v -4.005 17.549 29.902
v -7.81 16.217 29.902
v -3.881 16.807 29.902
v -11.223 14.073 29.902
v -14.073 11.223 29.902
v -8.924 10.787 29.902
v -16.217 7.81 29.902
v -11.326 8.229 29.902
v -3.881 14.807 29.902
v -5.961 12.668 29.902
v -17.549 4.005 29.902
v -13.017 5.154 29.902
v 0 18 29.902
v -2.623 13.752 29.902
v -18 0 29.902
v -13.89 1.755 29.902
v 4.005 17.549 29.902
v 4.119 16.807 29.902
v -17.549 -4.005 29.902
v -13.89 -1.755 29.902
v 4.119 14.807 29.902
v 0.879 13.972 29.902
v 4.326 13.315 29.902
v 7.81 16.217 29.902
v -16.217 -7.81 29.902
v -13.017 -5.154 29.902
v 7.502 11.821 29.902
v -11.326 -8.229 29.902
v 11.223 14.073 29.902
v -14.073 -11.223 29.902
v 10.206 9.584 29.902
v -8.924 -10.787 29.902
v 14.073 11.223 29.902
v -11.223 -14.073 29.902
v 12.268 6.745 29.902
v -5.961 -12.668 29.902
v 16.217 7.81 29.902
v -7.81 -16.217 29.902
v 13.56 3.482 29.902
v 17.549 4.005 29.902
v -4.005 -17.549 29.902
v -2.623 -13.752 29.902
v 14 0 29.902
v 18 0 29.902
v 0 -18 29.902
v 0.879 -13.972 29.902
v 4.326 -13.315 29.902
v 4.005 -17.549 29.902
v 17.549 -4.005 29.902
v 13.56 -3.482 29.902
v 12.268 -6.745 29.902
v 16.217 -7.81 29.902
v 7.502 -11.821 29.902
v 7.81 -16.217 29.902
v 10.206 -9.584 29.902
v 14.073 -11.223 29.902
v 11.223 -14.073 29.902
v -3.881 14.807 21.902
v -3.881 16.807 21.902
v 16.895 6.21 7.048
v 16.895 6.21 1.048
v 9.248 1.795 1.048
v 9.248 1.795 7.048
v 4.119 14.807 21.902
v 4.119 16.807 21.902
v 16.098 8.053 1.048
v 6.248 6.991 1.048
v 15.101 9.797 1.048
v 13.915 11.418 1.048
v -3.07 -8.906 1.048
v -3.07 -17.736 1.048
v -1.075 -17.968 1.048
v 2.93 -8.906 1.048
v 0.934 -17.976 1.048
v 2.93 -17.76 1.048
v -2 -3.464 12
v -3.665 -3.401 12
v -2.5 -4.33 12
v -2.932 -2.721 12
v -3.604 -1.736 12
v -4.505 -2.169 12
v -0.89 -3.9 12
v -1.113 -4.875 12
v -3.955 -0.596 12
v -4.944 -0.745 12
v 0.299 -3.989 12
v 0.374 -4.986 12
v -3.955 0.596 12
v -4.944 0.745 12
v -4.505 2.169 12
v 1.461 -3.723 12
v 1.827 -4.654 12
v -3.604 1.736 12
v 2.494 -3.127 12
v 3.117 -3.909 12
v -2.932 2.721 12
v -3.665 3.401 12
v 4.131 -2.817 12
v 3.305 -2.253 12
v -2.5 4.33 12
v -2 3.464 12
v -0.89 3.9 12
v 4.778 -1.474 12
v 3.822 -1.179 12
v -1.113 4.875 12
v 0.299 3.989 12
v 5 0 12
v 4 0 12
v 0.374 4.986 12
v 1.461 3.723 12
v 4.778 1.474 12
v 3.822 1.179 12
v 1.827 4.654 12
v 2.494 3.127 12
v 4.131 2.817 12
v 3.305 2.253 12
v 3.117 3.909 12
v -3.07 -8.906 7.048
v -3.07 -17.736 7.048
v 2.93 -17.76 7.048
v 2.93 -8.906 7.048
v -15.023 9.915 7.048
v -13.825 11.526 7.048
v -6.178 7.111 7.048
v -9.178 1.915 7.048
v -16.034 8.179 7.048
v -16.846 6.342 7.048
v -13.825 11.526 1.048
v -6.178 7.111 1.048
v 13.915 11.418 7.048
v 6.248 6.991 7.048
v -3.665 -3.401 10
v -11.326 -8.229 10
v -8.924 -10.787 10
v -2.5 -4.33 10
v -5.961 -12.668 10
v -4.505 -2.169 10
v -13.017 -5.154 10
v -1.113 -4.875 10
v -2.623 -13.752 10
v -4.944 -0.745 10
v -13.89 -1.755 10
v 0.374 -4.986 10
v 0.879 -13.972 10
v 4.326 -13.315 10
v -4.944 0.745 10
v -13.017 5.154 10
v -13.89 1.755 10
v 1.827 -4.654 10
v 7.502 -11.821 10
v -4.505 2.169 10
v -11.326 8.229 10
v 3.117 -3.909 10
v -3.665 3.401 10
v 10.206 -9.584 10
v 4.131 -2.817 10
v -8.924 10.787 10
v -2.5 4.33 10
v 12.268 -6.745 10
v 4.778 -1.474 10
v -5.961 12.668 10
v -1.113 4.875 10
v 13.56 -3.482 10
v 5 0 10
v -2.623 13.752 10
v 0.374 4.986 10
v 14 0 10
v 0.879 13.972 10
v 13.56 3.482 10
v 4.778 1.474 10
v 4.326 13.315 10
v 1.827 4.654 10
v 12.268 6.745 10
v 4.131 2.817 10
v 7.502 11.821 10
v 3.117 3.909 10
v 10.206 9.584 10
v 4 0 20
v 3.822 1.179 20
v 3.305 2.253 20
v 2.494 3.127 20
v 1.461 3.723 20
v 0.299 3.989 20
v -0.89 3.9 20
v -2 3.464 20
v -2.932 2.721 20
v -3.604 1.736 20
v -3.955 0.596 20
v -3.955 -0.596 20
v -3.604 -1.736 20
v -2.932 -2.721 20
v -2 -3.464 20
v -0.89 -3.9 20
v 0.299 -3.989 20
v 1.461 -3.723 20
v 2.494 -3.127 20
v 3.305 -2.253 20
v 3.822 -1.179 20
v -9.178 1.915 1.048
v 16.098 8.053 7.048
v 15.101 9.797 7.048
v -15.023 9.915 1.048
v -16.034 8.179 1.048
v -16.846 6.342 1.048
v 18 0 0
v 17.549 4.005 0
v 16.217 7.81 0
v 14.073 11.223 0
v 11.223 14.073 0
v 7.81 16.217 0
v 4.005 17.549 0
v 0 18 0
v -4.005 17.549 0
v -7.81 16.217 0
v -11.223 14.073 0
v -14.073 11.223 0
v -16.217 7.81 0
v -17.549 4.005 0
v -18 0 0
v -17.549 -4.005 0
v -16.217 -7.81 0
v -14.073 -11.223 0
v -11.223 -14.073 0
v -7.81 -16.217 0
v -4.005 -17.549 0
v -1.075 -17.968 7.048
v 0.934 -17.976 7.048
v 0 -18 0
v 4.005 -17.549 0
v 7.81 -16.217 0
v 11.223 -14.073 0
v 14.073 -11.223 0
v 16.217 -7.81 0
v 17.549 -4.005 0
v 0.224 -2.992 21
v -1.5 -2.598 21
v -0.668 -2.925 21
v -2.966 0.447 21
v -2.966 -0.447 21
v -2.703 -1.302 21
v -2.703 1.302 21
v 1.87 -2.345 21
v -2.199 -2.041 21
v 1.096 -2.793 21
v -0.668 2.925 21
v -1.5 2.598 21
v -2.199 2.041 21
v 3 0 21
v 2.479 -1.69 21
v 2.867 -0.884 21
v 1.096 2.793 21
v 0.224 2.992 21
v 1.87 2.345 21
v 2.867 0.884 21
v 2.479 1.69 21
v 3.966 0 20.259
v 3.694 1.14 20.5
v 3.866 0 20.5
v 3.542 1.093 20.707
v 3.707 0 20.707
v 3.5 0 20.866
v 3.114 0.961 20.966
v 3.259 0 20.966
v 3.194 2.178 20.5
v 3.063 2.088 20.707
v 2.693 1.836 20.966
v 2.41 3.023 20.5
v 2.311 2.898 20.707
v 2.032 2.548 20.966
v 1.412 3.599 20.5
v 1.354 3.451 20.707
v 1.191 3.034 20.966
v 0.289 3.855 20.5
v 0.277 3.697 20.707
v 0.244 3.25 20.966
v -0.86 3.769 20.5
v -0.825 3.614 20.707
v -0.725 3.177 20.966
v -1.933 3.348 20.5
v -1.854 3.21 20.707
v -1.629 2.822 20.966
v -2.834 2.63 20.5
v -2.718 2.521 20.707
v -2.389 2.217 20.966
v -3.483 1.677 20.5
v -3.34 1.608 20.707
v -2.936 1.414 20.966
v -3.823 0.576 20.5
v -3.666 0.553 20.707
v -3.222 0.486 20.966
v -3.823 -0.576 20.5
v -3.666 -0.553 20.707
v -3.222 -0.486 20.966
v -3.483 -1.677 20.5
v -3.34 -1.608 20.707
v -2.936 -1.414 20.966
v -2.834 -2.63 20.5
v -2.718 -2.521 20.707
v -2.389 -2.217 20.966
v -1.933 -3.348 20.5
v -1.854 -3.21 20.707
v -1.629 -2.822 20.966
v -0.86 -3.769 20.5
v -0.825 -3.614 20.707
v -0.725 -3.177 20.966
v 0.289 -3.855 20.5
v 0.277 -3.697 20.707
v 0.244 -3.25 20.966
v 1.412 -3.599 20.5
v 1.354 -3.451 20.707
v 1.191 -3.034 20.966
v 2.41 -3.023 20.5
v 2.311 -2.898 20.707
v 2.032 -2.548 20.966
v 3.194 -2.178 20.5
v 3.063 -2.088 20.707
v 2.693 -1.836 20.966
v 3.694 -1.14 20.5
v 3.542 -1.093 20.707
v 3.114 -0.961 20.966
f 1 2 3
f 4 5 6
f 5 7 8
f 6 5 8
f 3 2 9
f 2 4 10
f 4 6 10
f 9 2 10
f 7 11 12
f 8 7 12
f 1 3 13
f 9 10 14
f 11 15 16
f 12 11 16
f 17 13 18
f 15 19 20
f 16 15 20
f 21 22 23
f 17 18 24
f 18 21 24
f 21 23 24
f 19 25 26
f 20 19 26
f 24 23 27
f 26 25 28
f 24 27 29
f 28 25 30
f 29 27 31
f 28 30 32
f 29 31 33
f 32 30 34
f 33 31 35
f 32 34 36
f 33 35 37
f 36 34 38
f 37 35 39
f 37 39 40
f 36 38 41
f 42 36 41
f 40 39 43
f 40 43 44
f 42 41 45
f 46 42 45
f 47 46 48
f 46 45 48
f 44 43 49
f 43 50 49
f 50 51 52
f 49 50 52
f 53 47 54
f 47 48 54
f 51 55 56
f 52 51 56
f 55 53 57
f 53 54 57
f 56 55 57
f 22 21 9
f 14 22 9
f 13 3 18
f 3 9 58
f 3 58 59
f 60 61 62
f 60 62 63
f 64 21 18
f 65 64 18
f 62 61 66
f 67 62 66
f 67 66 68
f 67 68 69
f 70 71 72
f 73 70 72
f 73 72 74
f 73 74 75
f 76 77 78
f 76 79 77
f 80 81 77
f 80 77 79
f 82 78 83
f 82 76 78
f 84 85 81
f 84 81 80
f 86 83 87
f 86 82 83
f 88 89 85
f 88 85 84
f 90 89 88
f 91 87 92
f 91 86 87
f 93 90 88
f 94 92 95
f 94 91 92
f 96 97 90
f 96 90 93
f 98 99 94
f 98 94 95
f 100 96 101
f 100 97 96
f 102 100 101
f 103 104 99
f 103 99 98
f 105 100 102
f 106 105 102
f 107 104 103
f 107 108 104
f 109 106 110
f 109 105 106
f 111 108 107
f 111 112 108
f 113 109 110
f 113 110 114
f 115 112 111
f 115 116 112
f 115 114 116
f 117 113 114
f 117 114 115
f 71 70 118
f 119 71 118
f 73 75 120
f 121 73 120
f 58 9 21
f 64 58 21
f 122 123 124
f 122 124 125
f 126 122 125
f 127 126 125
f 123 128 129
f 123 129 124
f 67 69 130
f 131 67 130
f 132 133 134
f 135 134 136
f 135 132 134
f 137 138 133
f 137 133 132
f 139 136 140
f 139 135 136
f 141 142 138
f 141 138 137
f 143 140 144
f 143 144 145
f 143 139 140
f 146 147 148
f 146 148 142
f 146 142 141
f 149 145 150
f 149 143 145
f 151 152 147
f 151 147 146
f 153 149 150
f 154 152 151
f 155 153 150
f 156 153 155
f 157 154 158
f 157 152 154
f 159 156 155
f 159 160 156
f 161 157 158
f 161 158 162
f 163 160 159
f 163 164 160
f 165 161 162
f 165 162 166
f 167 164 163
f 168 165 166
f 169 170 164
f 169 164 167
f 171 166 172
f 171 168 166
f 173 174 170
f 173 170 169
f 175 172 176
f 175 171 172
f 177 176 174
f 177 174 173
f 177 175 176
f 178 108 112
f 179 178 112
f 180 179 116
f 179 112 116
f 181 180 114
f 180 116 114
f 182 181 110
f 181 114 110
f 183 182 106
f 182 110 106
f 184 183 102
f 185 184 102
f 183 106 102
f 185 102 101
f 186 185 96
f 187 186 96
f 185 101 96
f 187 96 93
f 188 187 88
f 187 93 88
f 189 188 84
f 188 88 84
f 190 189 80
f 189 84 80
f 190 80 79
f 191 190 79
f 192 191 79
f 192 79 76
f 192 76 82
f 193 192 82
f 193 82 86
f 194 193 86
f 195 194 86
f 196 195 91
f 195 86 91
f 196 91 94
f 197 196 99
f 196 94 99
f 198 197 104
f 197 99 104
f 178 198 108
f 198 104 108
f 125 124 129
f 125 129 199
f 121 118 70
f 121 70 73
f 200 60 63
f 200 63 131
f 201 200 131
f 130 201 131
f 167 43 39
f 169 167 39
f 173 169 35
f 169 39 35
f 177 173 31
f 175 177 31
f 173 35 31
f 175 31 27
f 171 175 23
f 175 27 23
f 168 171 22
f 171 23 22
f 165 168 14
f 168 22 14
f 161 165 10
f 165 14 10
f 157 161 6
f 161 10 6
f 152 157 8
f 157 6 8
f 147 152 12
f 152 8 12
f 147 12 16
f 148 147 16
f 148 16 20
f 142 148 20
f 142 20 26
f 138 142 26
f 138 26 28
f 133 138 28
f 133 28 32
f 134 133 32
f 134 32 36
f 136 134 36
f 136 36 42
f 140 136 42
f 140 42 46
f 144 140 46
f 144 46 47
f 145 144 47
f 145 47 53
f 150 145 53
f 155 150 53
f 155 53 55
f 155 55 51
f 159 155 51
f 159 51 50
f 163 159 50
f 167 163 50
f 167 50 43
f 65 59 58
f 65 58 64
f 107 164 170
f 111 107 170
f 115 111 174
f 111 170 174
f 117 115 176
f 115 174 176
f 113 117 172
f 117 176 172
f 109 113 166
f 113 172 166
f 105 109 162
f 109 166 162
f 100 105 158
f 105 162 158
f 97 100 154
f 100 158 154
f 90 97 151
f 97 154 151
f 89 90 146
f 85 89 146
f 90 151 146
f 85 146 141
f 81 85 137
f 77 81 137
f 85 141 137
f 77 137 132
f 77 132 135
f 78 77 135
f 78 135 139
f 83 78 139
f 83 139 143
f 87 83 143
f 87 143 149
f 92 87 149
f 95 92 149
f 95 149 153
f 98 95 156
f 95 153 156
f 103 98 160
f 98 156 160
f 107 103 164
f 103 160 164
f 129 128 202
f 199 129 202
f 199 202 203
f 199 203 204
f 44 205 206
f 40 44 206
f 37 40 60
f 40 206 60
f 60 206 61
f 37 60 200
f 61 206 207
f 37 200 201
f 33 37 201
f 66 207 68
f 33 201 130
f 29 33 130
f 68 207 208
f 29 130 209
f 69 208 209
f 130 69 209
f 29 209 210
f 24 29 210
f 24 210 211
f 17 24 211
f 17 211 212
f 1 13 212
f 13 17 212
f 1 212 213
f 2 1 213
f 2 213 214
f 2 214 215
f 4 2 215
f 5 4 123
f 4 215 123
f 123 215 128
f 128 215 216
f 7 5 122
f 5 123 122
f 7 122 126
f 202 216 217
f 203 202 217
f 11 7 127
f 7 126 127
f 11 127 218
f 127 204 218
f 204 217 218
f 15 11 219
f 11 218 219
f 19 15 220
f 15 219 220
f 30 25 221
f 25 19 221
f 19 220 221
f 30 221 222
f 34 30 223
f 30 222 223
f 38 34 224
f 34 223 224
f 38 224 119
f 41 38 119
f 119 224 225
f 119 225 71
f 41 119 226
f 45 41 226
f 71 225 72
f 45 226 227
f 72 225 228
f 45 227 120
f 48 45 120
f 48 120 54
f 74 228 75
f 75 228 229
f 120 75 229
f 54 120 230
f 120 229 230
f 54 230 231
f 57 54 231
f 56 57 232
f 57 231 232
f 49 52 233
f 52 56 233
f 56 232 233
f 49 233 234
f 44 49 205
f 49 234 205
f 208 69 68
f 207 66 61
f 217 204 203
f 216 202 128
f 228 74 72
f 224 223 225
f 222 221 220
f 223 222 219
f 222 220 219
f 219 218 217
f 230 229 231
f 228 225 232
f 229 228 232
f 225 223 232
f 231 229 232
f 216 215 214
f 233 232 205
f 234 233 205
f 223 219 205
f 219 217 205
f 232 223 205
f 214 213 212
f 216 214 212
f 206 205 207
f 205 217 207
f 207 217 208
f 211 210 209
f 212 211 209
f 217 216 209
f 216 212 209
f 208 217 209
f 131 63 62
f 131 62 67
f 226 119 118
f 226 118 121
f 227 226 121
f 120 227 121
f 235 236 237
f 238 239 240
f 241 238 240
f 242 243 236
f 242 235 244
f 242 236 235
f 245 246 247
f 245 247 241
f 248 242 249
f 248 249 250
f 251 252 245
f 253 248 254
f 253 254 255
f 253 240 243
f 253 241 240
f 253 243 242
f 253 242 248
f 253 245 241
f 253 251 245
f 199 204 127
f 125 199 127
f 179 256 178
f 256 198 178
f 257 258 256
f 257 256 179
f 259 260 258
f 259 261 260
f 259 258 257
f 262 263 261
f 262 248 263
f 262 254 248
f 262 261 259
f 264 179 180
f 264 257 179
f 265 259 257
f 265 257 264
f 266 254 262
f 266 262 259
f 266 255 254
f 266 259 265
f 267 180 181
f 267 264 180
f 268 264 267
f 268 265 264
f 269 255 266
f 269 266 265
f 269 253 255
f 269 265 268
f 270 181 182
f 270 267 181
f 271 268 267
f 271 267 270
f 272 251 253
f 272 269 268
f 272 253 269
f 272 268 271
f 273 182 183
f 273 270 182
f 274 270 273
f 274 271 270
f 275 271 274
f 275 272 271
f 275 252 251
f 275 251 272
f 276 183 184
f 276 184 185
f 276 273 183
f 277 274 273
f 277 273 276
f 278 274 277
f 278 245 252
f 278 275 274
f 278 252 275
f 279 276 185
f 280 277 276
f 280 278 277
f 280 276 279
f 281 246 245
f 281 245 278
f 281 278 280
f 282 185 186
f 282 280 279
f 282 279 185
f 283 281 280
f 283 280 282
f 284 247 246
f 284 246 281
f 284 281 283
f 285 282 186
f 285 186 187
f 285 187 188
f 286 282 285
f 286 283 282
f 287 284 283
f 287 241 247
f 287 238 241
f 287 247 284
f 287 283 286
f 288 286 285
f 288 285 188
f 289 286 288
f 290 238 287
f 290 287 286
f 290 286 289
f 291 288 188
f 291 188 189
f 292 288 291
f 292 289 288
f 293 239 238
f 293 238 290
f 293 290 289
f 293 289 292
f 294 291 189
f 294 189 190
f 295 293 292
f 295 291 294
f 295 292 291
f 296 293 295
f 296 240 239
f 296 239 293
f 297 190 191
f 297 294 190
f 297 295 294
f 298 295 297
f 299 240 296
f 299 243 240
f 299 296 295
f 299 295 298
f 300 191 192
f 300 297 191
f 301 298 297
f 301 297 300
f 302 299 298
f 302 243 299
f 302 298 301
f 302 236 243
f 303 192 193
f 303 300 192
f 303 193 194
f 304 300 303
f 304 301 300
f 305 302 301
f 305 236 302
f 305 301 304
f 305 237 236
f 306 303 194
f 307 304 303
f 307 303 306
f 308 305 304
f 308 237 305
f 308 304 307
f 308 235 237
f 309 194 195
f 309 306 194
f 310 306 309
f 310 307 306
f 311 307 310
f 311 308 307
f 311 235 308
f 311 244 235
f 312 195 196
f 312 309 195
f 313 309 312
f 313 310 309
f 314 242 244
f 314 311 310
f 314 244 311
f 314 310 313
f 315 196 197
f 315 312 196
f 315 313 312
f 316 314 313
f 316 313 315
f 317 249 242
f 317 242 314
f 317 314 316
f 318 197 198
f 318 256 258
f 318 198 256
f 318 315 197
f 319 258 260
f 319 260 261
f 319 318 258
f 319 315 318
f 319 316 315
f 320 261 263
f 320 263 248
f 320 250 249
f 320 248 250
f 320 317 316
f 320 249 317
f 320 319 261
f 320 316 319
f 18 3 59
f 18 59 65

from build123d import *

# Parameters (mm, degrees)
SKETCH_R           = 18
PAD_DEPTH          = 30
SKETCH001_R        = 14
POCKET_DEPTH       = 20
SKETCH002_R        = 5
PAD001_DEPTH       = 2
SKETCH003_R        = 4
PAD002_DEPTH       = 9
FILLET_R           = 1
SKETCH004_W        = 47.033489
SKETCH004_H        = 47.446069
PAD003_DEPTH       = 10
SKETCH005_W        = 6
SKETCH005_H        = 6
POCKET001_DEPTH    = 15
POLARPATTERN_COUNT = 3
SKETCH006_W        = 48.40057
SKETCH006_H        = 10.44081
POCKET002_DEPTH    = 47.447069
SKETCH007_W        = 8
SKETCH007_H        = 2
POCKET003_DEPTH    = 8


with BuildPart() as part:
    # Sketch → Pad (new body)
    with BuildSketch(Plane.XY):
        Circle(SKETCH_R)
    extrude(amount=PAD_DEPTH)

    # Sketch001 (on Face3 of Pad) → Pocket (cut)
    with BuildSketch(Plane.XY.offset(30)):
        Circle(SKETCH001_R)
    extrude(amount=-POCKET_DEPTH, mode=Mode.SUBTRACT)

    # Sketch002 (on Face5 of Pocket) → Pad001 (join)
    with BuildSketch(Plane.XY.offset(10)):
        Circle(SKETCH002_R)
    extrude(amount=PAD001_DEPTH)

    # Sketch003 (on Face7 of Pad001) → Pad002 (join)
    with BuildSketch(Plane.XY.offset(12)):
        Circle(SKETCH003_R)
    extrude(amount=PAD002_DEPTH)

    # Fillet
    fillet_edges = [part.edges().sort_by_distance(p)[0] for p in [
        (-4, 0, 21),
    ]]
    fillet(fillet_edges, radius=FILLET_R)

    # Sketch004 (on Face8 of Fillet) → Pad003 (join)
    with BuildSketch(Plane.XY.offset(30)):
        with Locations((0.145404, -0.183003)):
            Rectangle(SKETCH004_W, SKETCH004_H)
    extrude(amount=PAD003_DEPTH)

    # Sketch005 (on Face6 of Pad003) → Pocket001 (cut)
    with BuildSketch(Plane.XZ.offset(23.906038)):
        with Locations((-0.069517, 4.047801)):
            Rectangle(SKETCH005_W, SKETCH005_H)
    pocket001 = extrude(amount=-POCKET001_DEPTH, mode=Mode.SUBTRACT)

    # PolarPattern: Pocket001 ×3 about axis
    polarpattern_axis = Axis((0, 0, 0), (0, 0, 1))
    for i in range(1, POLARPATTERN_COUNT):
        add(pocket001.rotate(polarpattern_axis, i * 360 / POLARPATTERN_COUNT), mode=Mode.SUBTRACT)

    # Sketch006 (on Face6 of PolarPattern) → Pocket002 (cut, through all)
    with BuildSketch(Plane.XZ.offset(23.906038)):
        with Locations((0.264744, 35.122468)):
            Rectangle(SKETCH006_W, SKETCH006_H)
    extrude(amount=-POCKET002_DEPTH, mode=Mode.SUBTRACT)

    # Sketch007 (on Face2 of Pocket002) → Pocket003 (cut)
    with BuildSketch(Plane.XY.offset(29.902063)):
        with Locations((0.118946, 15.807168)):
            Rectangle(SKETCH007_W, SKETCH007_H)
    extrude(amount=-POCKET003_DEPTH, mode=Mode.SUBTRACT)


solid = part.part
